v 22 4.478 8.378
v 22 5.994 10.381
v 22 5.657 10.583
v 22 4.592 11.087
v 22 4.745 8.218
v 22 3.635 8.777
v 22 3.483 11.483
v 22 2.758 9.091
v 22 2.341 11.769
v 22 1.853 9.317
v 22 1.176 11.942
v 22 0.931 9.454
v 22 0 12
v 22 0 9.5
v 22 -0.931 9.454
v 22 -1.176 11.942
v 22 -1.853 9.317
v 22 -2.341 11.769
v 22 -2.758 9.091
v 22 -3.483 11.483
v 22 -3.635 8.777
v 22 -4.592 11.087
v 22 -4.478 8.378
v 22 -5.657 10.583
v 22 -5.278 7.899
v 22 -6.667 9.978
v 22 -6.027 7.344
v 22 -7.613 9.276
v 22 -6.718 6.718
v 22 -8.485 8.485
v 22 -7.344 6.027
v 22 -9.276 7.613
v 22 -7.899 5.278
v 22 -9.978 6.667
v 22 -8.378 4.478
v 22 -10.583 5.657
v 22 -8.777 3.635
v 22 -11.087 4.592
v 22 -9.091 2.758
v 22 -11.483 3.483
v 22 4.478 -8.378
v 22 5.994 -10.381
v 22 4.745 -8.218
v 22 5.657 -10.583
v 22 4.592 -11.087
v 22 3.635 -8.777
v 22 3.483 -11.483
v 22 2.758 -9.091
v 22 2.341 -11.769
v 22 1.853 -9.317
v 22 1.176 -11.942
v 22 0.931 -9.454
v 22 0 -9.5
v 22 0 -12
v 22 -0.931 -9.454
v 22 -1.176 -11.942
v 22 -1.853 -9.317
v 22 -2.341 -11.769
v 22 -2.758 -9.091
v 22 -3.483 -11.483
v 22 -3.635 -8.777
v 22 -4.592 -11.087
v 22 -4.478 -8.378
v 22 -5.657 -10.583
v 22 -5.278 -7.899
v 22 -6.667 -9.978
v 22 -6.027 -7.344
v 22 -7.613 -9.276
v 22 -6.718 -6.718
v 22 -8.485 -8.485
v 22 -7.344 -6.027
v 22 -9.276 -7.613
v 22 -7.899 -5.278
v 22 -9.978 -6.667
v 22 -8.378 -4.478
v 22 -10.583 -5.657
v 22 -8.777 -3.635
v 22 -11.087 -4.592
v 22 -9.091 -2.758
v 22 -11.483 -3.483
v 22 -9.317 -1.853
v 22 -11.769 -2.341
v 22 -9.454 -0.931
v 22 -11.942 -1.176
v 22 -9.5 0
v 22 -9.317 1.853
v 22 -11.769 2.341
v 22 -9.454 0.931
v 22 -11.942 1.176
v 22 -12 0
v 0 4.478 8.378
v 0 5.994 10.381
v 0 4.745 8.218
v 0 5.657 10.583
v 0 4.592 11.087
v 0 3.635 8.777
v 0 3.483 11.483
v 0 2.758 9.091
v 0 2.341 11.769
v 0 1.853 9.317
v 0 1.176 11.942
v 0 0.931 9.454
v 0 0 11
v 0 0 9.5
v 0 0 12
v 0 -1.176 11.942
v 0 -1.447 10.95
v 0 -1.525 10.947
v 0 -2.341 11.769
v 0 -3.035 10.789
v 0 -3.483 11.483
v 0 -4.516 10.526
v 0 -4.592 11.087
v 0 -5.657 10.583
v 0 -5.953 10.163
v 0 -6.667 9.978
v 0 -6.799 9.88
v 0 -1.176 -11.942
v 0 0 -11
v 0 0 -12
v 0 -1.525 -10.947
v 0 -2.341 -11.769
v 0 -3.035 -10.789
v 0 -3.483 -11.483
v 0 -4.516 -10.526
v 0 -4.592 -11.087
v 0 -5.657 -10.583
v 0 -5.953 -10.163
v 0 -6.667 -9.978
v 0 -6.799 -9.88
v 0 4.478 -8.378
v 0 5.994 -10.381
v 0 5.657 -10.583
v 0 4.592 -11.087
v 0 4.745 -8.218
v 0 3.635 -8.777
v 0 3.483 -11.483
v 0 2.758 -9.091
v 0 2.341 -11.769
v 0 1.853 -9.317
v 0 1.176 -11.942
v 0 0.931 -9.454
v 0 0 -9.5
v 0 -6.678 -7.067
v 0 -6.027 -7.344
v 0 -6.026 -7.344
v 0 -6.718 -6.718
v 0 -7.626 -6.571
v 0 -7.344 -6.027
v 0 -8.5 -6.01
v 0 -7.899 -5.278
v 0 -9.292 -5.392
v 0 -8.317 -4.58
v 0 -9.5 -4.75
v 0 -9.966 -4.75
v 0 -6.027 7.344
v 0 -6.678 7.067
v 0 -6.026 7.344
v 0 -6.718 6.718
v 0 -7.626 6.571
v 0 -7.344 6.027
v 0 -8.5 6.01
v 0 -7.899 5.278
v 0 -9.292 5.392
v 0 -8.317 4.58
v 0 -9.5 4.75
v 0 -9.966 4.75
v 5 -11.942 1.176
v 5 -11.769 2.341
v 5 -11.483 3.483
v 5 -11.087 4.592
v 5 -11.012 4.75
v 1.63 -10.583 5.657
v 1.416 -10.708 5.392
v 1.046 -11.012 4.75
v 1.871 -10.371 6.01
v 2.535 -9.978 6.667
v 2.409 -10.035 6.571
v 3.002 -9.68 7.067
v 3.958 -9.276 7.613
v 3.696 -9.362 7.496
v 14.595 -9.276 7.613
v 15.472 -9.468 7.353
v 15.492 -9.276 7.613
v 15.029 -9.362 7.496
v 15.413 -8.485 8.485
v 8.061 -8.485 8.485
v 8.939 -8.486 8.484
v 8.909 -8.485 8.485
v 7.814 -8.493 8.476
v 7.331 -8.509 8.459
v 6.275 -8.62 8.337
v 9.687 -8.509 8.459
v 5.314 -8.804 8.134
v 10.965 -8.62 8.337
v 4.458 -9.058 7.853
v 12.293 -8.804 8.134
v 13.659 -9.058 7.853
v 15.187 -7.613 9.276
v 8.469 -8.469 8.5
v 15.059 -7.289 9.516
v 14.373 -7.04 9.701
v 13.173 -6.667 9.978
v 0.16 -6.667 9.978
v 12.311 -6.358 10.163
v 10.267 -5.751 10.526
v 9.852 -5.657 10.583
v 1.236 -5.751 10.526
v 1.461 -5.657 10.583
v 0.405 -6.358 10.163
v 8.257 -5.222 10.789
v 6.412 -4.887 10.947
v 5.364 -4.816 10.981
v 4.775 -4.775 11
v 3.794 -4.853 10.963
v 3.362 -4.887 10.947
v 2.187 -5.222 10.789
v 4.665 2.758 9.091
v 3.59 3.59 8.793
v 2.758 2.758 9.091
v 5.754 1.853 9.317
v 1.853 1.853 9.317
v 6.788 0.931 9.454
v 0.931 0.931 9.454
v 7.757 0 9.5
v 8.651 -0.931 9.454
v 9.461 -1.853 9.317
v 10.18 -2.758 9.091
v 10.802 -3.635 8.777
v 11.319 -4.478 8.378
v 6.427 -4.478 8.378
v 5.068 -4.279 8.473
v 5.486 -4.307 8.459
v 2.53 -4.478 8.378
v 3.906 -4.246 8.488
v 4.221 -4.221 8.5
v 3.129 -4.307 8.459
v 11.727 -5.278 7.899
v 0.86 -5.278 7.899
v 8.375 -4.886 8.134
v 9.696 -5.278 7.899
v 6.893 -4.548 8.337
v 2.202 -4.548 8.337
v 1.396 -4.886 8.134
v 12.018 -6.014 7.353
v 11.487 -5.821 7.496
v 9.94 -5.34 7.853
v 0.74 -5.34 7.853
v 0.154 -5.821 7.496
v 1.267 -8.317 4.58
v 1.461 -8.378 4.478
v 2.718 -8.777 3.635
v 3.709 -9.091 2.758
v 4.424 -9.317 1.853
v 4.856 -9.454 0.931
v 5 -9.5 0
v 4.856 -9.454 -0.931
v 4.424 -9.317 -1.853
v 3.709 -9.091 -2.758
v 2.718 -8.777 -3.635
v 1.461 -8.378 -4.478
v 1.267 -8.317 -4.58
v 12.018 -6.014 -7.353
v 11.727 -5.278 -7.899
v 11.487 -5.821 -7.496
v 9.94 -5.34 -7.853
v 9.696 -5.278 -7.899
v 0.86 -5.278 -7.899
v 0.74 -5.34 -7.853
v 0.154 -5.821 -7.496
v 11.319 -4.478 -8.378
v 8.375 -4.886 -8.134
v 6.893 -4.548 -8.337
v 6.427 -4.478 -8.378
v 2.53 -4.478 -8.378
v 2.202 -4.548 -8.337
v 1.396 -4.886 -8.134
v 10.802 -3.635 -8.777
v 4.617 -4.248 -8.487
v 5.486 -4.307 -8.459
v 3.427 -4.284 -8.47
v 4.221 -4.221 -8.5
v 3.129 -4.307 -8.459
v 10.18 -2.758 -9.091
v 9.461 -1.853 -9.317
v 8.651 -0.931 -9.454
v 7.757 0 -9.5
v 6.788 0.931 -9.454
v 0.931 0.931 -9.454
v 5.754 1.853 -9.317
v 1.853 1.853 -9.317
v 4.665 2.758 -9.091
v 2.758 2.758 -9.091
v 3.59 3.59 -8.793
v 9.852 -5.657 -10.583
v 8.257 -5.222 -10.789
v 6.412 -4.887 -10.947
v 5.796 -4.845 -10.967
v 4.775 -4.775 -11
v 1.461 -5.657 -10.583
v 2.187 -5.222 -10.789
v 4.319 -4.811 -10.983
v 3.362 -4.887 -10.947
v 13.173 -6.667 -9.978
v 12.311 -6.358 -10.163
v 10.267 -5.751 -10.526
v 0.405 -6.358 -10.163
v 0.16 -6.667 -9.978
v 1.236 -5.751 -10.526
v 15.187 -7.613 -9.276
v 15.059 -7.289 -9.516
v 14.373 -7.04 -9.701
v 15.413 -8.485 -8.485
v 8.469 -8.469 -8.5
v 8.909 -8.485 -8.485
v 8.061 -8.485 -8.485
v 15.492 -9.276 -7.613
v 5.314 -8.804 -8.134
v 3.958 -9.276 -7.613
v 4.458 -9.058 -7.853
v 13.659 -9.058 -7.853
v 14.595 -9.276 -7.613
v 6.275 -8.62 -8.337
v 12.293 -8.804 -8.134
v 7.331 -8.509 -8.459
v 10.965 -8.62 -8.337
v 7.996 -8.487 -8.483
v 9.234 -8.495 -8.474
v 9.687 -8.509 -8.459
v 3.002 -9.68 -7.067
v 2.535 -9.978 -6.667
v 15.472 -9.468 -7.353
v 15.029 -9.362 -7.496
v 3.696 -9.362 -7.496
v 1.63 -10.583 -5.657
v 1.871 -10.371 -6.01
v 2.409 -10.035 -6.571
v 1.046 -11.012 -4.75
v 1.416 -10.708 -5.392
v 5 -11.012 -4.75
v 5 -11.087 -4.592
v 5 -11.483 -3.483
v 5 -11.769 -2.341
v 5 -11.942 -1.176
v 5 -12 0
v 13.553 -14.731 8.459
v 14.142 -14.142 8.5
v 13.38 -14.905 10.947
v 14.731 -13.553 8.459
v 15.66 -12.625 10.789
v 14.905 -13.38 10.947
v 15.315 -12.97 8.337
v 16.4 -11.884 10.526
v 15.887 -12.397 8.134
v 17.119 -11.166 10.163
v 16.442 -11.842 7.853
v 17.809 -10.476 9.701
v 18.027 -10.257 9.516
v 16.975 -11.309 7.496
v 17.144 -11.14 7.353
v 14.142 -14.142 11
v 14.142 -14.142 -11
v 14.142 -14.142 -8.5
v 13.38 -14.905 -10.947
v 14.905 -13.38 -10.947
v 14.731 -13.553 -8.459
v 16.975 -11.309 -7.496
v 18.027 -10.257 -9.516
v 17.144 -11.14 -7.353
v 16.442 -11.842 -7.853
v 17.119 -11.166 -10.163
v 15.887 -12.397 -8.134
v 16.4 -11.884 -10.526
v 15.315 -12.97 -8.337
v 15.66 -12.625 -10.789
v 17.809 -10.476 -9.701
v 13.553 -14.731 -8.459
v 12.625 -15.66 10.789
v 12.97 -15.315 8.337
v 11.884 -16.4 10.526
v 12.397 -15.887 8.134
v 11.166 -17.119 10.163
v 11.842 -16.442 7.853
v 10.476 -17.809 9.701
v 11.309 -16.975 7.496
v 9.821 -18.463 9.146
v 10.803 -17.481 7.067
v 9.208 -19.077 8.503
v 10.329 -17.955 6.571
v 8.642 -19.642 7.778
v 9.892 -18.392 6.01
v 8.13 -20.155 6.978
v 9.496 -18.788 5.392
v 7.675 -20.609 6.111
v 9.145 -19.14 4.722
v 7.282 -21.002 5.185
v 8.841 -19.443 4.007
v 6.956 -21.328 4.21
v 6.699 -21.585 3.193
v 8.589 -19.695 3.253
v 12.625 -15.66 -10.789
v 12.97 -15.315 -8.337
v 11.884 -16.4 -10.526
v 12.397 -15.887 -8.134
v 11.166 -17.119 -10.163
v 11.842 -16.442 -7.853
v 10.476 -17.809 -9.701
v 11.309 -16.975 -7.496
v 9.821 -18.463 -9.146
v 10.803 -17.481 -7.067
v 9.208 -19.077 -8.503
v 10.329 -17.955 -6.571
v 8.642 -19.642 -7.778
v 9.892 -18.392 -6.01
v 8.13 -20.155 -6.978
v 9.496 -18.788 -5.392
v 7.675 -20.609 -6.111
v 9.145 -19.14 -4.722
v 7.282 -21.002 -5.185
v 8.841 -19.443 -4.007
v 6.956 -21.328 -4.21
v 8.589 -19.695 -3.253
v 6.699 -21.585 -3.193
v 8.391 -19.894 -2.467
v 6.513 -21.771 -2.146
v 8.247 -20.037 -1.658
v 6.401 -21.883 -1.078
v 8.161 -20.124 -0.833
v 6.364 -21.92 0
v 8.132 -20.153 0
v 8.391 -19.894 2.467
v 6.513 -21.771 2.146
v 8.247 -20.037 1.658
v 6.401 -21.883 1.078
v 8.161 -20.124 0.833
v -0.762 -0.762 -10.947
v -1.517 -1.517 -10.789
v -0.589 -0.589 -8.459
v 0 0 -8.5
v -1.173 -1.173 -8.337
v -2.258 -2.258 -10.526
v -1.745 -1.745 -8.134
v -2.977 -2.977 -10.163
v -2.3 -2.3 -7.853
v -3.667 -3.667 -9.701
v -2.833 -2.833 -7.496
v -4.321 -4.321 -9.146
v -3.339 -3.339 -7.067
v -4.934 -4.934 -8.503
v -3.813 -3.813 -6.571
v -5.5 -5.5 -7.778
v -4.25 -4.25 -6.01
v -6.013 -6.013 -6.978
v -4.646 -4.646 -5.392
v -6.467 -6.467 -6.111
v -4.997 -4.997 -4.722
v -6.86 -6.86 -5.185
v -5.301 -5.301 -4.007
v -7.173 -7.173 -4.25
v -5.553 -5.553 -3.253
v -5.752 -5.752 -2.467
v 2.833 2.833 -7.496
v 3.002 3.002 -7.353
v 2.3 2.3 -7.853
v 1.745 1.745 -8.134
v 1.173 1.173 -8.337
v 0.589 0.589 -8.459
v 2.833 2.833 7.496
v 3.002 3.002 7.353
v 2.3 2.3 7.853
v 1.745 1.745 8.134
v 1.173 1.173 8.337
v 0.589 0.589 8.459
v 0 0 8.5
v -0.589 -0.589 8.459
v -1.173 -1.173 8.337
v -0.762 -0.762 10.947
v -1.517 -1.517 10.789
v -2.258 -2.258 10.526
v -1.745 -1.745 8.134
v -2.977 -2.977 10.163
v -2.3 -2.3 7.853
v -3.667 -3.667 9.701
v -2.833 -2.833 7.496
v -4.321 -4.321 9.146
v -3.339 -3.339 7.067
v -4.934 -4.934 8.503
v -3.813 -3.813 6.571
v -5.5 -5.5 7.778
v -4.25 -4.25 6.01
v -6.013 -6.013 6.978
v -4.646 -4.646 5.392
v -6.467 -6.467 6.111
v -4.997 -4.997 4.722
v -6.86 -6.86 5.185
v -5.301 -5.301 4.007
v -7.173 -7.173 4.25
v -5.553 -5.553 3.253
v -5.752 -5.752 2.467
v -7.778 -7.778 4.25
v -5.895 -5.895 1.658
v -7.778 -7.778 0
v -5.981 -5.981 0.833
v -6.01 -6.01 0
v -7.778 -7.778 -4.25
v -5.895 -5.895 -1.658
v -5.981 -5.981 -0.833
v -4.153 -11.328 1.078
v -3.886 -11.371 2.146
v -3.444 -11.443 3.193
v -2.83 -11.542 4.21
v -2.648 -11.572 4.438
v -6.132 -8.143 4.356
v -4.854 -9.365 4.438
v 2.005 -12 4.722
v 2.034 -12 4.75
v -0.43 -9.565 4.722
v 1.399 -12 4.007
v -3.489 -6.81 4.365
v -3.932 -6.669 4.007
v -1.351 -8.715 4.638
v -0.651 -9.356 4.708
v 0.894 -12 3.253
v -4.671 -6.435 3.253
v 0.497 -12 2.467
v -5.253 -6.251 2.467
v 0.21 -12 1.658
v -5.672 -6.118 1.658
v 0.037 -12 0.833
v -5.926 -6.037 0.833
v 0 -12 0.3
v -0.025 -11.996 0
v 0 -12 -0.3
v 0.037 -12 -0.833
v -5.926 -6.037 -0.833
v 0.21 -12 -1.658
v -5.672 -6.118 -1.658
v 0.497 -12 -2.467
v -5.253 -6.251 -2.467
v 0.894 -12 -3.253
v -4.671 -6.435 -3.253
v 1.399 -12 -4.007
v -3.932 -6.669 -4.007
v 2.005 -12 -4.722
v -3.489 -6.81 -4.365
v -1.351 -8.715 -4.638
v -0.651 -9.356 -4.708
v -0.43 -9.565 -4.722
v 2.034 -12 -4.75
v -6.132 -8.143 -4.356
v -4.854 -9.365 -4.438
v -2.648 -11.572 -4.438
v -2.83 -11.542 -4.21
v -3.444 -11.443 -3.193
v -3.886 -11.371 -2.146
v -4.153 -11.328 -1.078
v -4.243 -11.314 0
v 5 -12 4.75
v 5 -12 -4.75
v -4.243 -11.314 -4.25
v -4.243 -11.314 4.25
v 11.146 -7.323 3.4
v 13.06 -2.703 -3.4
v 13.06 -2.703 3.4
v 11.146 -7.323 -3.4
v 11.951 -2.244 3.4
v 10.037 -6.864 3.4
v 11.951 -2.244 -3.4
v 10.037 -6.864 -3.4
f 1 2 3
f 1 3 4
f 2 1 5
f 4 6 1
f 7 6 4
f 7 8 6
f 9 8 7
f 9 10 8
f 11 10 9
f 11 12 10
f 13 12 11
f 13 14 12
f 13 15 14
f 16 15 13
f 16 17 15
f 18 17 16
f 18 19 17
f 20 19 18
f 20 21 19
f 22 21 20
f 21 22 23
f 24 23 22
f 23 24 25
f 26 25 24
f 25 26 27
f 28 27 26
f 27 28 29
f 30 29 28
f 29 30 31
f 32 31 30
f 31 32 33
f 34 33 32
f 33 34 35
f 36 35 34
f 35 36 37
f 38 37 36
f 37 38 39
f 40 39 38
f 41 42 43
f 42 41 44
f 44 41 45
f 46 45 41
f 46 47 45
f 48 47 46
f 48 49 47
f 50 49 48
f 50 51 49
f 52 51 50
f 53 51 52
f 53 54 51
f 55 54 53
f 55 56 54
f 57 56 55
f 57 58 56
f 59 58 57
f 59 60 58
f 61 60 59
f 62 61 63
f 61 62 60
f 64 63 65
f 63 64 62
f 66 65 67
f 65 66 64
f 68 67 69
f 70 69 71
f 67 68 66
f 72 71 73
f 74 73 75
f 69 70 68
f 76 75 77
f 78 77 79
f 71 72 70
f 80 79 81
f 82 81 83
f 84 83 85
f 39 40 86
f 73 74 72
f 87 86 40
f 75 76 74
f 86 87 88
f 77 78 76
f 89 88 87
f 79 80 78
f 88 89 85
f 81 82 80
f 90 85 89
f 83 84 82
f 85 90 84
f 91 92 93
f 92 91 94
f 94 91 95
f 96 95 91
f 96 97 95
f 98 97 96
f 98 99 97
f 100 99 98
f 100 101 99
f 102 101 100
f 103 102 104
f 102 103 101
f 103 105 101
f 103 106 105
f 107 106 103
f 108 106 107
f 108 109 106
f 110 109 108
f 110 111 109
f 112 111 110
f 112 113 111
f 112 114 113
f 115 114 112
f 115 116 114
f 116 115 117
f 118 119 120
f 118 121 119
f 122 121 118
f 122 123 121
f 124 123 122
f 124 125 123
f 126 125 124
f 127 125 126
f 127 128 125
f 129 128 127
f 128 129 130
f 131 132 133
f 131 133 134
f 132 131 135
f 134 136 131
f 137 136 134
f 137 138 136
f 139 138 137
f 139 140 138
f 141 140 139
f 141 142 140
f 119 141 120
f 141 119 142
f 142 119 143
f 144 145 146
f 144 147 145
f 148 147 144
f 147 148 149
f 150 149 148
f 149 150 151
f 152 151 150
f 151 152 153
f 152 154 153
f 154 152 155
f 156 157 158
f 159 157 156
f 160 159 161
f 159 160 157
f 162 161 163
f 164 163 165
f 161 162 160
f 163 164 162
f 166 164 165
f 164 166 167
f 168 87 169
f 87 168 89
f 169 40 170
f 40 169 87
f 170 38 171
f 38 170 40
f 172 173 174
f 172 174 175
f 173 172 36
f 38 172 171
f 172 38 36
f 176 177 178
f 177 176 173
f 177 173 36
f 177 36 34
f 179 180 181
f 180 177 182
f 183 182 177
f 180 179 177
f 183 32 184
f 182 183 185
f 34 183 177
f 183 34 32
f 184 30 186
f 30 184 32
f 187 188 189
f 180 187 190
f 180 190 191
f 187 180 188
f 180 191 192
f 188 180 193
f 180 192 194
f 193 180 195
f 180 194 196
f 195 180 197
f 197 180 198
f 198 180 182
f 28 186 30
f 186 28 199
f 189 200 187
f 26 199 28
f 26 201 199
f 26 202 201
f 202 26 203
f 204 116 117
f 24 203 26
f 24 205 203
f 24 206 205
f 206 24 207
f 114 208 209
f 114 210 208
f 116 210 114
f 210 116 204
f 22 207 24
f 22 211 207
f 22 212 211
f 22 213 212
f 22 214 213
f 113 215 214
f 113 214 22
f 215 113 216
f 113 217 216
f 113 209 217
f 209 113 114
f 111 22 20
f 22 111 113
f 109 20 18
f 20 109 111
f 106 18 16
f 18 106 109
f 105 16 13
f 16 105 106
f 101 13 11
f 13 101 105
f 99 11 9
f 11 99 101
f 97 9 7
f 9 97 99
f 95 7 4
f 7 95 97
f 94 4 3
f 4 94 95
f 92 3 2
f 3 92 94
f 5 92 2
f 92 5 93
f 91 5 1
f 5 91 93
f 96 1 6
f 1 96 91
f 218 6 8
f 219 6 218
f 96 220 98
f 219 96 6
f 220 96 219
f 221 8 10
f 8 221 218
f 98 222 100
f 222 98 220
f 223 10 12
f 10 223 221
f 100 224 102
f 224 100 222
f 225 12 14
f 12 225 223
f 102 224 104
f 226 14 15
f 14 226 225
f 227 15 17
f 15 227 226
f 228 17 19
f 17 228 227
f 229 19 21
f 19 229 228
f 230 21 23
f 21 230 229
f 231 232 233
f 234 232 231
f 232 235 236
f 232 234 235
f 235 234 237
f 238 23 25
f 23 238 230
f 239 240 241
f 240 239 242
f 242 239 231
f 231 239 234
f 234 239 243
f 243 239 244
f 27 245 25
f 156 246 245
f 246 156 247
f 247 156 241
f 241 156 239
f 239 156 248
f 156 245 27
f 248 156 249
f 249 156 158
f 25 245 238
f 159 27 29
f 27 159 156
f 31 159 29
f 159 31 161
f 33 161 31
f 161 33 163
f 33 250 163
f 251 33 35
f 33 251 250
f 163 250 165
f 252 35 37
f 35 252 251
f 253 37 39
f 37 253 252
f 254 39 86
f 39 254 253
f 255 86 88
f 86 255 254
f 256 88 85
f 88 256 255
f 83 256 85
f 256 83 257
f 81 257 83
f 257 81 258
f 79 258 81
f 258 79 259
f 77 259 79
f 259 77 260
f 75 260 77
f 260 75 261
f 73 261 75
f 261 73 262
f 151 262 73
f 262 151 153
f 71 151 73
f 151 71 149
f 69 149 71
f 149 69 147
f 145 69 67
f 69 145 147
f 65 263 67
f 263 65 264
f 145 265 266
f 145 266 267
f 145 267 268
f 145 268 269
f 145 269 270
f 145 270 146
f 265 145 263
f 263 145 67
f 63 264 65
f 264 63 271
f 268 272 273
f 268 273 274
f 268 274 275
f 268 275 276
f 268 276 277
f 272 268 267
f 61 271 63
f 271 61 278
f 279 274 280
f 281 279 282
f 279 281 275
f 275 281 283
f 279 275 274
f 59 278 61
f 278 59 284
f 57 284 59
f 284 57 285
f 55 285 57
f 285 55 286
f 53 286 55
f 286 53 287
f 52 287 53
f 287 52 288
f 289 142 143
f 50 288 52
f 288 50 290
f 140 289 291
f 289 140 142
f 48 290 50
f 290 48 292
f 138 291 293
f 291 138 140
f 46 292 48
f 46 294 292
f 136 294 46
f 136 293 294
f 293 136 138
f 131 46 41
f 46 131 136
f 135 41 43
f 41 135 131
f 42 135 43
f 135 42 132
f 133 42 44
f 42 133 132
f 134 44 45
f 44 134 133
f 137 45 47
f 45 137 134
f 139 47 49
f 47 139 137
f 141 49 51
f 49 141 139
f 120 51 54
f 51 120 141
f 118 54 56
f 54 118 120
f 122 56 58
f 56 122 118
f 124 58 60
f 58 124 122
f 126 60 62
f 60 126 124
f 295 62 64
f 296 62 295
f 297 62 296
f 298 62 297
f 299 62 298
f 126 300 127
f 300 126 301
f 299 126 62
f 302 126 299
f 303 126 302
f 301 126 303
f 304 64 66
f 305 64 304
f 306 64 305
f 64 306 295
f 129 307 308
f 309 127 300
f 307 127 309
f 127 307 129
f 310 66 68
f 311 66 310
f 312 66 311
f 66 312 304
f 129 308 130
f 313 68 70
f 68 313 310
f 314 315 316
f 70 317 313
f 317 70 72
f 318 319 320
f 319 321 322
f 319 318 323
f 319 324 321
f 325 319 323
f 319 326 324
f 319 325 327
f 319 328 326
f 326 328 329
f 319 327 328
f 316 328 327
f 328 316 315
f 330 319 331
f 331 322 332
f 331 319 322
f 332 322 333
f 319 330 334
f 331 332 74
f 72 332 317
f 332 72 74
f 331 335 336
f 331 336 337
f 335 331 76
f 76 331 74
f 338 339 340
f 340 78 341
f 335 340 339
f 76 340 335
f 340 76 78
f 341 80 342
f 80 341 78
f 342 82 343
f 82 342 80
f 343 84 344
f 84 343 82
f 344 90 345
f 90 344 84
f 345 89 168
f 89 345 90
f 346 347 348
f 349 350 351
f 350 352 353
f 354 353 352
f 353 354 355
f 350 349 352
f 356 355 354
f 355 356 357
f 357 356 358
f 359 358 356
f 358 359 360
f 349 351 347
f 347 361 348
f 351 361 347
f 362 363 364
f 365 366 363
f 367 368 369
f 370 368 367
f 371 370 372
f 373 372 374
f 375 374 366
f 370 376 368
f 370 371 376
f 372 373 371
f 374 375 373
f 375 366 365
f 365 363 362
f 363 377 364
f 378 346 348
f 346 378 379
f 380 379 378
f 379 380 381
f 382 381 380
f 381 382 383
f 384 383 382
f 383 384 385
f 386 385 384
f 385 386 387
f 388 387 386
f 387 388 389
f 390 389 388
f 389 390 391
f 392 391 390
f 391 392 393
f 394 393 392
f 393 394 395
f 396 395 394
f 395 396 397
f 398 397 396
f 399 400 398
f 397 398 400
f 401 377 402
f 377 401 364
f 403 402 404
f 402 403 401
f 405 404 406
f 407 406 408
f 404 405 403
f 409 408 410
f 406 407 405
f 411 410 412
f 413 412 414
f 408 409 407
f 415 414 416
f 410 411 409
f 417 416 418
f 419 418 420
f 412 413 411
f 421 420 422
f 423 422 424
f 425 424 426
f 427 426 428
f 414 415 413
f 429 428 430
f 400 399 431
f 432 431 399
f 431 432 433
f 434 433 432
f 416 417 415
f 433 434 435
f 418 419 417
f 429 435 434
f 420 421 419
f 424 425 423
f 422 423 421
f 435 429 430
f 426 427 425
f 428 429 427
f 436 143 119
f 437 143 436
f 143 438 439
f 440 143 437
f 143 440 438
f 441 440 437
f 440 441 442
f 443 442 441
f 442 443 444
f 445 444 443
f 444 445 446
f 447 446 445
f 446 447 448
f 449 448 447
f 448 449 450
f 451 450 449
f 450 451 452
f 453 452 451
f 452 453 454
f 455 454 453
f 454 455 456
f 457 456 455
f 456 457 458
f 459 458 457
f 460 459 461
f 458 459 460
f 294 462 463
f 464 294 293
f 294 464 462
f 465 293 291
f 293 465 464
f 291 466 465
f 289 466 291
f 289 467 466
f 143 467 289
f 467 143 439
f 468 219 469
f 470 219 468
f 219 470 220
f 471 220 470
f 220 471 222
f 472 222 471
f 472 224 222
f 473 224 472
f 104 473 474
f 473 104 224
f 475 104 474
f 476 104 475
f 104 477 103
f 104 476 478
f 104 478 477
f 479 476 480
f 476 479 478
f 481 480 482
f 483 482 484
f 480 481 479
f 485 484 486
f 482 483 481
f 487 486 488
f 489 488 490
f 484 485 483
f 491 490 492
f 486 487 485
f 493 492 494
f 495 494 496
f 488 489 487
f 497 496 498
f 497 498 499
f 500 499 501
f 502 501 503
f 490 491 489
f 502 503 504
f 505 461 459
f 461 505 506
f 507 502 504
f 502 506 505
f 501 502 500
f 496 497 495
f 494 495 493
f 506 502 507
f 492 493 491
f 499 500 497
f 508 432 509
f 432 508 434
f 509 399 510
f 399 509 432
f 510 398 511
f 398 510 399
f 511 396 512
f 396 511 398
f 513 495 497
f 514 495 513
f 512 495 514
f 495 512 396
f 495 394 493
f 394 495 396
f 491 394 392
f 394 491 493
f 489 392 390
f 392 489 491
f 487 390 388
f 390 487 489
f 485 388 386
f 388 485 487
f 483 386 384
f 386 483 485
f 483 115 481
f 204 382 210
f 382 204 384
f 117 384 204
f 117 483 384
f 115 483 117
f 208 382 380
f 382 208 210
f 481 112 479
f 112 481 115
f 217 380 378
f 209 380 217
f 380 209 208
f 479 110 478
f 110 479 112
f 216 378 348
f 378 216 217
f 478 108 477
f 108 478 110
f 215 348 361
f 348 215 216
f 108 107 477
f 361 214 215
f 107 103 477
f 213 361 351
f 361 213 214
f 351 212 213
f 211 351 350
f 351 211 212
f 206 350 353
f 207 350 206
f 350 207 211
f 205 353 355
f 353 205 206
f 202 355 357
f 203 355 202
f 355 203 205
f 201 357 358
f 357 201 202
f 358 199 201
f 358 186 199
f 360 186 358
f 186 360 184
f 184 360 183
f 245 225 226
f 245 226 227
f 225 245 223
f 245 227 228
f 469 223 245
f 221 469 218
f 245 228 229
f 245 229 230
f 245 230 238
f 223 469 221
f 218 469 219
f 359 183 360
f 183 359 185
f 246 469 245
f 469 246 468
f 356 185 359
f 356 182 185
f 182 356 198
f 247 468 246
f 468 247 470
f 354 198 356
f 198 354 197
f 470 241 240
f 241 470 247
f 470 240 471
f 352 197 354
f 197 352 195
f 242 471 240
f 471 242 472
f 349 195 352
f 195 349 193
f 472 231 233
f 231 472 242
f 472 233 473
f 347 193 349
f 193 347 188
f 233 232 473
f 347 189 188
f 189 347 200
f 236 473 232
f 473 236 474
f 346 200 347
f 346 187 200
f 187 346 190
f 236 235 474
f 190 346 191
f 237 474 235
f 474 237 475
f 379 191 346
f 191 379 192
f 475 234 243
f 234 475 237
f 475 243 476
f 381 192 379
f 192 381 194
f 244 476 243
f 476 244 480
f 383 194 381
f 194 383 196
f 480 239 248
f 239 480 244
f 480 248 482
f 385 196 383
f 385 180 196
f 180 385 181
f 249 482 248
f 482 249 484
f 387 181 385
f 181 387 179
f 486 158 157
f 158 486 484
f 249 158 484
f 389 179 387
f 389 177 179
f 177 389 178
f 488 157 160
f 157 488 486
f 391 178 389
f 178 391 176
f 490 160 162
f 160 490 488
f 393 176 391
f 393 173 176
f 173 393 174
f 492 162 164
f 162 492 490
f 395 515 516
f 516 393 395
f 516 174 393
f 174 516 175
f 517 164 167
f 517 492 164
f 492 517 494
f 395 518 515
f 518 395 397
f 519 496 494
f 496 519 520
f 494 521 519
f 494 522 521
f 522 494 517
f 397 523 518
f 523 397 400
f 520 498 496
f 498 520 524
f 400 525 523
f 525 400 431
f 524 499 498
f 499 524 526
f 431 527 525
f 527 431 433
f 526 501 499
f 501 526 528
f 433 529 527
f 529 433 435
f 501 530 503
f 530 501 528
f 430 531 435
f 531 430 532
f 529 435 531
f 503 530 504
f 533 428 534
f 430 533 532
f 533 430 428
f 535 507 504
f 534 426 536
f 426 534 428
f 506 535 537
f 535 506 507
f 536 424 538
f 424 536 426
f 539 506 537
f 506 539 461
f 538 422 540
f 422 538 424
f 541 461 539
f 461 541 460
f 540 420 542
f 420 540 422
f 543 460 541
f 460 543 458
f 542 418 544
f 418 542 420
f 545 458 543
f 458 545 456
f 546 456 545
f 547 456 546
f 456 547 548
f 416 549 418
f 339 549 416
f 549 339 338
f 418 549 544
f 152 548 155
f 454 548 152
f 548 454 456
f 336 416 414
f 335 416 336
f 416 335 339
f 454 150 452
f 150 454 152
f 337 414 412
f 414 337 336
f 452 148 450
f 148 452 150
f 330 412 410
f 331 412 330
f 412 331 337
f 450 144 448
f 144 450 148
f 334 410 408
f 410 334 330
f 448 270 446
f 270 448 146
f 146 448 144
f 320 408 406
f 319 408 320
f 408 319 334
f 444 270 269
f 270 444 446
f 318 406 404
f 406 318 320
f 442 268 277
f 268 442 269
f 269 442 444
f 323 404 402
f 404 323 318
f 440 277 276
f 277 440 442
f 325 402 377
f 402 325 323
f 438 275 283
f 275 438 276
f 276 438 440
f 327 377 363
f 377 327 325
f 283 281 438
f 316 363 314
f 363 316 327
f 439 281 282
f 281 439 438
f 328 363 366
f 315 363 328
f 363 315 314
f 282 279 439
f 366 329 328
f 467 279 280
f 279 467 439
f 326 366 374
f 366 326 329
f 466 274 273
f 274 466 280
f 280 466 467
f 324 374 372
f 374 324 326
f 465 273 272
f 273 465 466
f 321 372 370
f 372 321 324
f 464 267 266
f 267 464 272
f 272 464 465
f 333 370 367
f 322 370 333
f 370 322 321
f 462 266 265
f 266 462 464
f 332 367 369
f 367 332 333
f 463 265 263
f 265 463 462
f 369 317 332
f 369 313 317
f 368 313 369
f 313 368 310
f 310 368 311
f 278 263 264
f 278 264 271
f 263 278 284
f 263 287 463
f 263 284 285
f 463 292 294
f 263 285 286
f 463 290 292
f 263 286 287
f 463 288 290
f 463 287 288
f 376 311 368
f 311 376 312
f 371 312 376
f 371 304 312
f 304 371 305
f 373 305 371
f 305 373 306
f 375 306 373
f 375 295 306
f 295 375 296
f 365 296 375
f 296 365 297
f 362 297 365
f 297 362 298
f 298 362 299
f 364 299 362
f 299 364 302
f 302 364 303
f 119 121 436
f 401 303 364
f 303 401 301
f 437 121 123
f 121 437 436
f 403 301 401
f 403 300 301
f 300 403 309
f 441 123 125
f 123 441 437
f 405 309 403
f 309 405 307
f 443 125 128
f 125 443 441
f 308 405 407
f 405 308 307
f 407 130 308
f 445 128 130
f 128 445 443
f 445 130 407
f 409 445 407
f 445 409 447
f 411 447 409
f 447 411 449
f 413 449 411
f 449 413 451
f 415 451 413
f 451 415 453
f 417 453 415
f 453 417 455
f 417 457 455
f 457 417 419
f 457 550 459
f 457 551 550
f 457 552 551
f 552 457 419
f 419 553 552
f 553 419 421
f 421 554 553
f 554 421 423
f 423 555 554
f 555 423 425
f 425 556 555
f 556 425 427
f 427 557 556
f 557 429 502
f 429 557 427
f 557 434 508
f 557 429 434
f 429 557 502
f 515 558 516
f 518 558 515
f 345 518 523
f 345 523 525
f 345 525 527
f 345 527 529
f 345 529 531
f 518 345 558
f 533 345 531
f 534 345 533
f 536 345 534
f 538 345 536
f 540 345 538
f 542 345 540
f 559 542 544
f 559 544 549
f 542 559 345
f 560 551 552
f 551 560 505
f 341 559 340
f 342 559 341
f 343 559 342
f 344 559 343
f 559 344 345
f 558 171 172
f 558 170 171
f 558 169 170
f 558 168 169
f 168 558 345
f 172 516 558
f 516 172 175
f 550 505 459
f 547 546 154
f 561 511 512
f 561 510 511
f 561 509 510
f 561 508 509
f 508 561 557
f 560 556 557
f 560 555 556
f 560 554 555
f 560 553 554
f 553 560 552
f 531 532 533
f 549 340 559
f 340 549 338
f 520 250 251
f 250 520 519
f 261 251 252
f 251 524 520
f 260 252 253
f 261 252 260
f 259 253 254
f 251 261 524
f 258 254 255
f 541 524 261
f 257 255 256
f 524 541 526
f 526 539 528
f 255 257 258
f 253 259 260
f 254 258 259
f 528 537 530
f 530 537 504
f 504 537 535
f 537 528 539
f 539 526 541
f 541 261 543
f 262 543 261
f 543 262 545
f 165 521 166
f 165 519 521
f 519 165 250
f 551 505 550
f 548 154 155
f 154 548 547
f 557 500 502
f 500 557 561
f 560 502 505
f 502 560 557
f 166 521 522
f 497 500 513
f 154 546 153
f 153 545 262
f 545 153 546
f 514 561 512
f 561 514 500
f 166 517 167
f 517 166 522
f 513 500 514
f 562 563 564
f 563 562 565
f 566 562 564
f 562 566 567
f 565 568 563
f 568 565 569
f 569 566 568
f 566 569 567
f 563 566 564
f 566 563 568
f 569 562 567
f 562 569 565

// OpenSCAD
// ═══════════════════════════════════════════════════════════════
// Finger Angle Jig — Parametric v2
// Supports all 14 joints tracked by PhalanX / MediaPipe:
//   Thumb:                   MCP, IP
//   Index / Middle / Ring / Little:  MCP, PIP, DIP
//
// Design: two C-shaped cuffs (palmar-side only) bridged at the joint.
// Dorsal face fully open — MediaPipe landmarks remain unobstructed.
//
// PRINT SETTINGS:
//   Material: TPU Shore 95A (flexible, comfortable) — preferred
//             PLA works but is rigid; increase wall to 3.0 mm
//   Layer height: 0.2 mm | Walls: 3 | Infill: 40% | No supports
//   Orientation: flat on build plate (bridge face down)
//
// USAGE:
//   1. Set finger + joint below
//   2. Set angle (0 = straight, 90 = fully bent)
//   3. Print, slip onto finger, record ML samples
//   4. If cuffs are tight/loose, measure finger circumference
//      with a soft tape, divide by 3.14159, and override with
//      prox_diam_ov / dist_diam_ov
//
// COORDINATE SYSTEM:
//   Joint at origin. Proximal phalanx along +X. Dorsal = +Y.
// ═══════════════════════════════════════════════════════════════

// ── USER PARAMETERS ───────────────────────────────────────────

finger = "index";   // "thumb" | "index" | "middle" | "ring" | "little"
joint  = "pip";     // thumb: "mcp" | "ip"    others: "mcp" | "pip" | "dip"
angle  = 45;        // Flexion angle in degrees. 0 = straight, 90 = right angle.

// Diameter overrides — set to 0 to auto-select from lookup table.
// Measure: wrap soft tape around finger at that segment, divide by pi.
prox_diam_ov = 0;   // Proximal cuff inner diameter (mm)
dist_diam_ov = 0;   // Distal cuff inner diameter (mm)
prox_len_ov  = 0;   // Proximal cuff length along finger (mm)
dist_len_ov  = 0;   // Distal cuff length along finger (mm)

wall       = 2.5;   // Cuff wall thickness. 2.0 for TPU, 3.0 for PLA.
dorsal_gap = 120;   // Degrees open on camera/dorsal side. Min ~90 to stay on.
                    // Wider = easier to put on + less visual interference.

$fn = 64;

// ── DIMENSION LOOKUP TABLE ────────────────────────────────────
// [prox_diam, dist_diam, prox_len, dist_len] — all in mm
// Diameters are finger segment inner diameters for an average adult hand.
// Lengths are cuff lengths along the bone axis.
//
// Joints per finger (proximal → distal):
//   Thumb:   MCP (knuckle at base), IP (interphalangeal)
//   Fingers: MCP (knuckle at base), PIP (middle knuckle), DIP (tip knuckle)

function dims(f, j) =
    // ── Thumb ──────────────────────────────────────────────────
    f == "thumb"  && j == "mcp" ? [23, 21, 28, 24] :
    f == "thumb"  && j == "ip"  ? [21, 18, 22, 18] :
    // ── Index ──────────────────────────────────────────────────
    f == "index"  && j == "mcp" ? [21, 19, 28, 24] :
    f == "index"  && j == "pip" ? [19, 17, 22, 20] :
    f == "index"  && j == "dip" ? [17, 15, 18, 16] :
    // ── Middle ─────────────────────────────────────────────────
    f == "middle" && j == "mcp" ? [22, 20, 28, 24] :
    f == "middle" && j == "pip" ? [20, 18, 22, 20] :
    f == "middle" && j == "dip" ? [18, 16, 18, 16] :
    // ── Ring ───────────────────────────────────────────────────
    f == "ring"   && j == "mcp" ? [20, 18, 28, 24] :
    f == "ring"   && j == "pip" ? [18, 16, 22, 20] :
    f == "ring"   && j == "dip" ? [16, 14, 18, 16] :
    // ── Little ─────────────────────────────────────────────────
    f == "little" && j == "mcp" ? [17, 15, 28, 24] :
    f == "little" && j == "pip" ? [15, 13, 22, 20] :
    f == "little" && j == "dip" ? [13, 11, 18, 16] :
    [18, 16, 22, 20]; // fallback

d = dims(finger, joint);

prox_diam = prox_diam_ov > 0 ? prox_diam_ov : d[0];
dist_diam = dist_diam_ov > 0 ? dist_diam_ov : d[1];
prox_len  = prox_len_ov  > 0 ? prox_len_ov  : d[2];
dist_len  = dist_len_ov  > 0 ? dist_len_ov  : d[3];

// ── C-SHAPED CROSS-SECTION ────────────────────────────────────
// Drawn in XY plane. Gap opens at +Y (dorsal = camera side).
module c_profile(inner_r, outer_r, gap_deg) {
    difference() {
        difference() {
            circle(r = outer_r);
            circle(r = inner_r);
        }
        polygon(concat(
            [[0, 0]],
            [for (a = [90 - gap_deg/2 : 1 : 90 + gap_deg/2])
                [(outer_r + 1) * cos(a), (outer_r + 1) * sin(a)]]
        ));
    }
}

// ── CUFF ──────────────────────────────────────────────────────
module cuff(inner_d, length, gap_deg) {
    rotate([0, -90, 0])
    linear_extrude(height = length, center = true)
        c_profile(inner_d / 2, inner_d / 2 + wall, gap_deg);
}

// ── ANGLE REFERENCE TICK ──────────────────────────────────────
// Small raised ridge on the bridge at the joint hinge — lets you
// verify the printed angle with a goniometer before recording.
module angle_tick() {
    rotate([0, 0, -angle / 2])
    translate([prox_diam / 2 + wall + 0.5, 0, 0])
        cube([1.2, wall * 2, min(prox_diam, dist_diam) * 0.4], center = true);
}

// ── ASSEMBLY ──────────────────────────────────────────────────

// 1. Proximal cuff
translate([prox_len / 2, 0, 0])
    cuff(prox_diam, prox_len, dorsal_gap);

// 2. Distal cuff (flexed toward palm)
rotate([0, 0, -angle])
    translate([dist_len / 2, 0, 0])
    cuff(dist_diam, dist_len, dorsal_gap);

// 3. Palmar bridge — smooth hull between the two cuffs at the joint
hull() {
    translate([wall, -(prox_diam / 2 + wall / 2), 0])
        cube([wall * 2, wall, prox_diam * 0.5], center = true);

    rotate([0, 0, -angle])
    translate([wall, -(dist_diam / 2 + wall / 2), 0])
        cube([wall * 2, wall, dist_diam * 0.5], center = true);
}

// 4. Angle reference tick (palmar side, at bisector of the joint angle)
angle_tick();
